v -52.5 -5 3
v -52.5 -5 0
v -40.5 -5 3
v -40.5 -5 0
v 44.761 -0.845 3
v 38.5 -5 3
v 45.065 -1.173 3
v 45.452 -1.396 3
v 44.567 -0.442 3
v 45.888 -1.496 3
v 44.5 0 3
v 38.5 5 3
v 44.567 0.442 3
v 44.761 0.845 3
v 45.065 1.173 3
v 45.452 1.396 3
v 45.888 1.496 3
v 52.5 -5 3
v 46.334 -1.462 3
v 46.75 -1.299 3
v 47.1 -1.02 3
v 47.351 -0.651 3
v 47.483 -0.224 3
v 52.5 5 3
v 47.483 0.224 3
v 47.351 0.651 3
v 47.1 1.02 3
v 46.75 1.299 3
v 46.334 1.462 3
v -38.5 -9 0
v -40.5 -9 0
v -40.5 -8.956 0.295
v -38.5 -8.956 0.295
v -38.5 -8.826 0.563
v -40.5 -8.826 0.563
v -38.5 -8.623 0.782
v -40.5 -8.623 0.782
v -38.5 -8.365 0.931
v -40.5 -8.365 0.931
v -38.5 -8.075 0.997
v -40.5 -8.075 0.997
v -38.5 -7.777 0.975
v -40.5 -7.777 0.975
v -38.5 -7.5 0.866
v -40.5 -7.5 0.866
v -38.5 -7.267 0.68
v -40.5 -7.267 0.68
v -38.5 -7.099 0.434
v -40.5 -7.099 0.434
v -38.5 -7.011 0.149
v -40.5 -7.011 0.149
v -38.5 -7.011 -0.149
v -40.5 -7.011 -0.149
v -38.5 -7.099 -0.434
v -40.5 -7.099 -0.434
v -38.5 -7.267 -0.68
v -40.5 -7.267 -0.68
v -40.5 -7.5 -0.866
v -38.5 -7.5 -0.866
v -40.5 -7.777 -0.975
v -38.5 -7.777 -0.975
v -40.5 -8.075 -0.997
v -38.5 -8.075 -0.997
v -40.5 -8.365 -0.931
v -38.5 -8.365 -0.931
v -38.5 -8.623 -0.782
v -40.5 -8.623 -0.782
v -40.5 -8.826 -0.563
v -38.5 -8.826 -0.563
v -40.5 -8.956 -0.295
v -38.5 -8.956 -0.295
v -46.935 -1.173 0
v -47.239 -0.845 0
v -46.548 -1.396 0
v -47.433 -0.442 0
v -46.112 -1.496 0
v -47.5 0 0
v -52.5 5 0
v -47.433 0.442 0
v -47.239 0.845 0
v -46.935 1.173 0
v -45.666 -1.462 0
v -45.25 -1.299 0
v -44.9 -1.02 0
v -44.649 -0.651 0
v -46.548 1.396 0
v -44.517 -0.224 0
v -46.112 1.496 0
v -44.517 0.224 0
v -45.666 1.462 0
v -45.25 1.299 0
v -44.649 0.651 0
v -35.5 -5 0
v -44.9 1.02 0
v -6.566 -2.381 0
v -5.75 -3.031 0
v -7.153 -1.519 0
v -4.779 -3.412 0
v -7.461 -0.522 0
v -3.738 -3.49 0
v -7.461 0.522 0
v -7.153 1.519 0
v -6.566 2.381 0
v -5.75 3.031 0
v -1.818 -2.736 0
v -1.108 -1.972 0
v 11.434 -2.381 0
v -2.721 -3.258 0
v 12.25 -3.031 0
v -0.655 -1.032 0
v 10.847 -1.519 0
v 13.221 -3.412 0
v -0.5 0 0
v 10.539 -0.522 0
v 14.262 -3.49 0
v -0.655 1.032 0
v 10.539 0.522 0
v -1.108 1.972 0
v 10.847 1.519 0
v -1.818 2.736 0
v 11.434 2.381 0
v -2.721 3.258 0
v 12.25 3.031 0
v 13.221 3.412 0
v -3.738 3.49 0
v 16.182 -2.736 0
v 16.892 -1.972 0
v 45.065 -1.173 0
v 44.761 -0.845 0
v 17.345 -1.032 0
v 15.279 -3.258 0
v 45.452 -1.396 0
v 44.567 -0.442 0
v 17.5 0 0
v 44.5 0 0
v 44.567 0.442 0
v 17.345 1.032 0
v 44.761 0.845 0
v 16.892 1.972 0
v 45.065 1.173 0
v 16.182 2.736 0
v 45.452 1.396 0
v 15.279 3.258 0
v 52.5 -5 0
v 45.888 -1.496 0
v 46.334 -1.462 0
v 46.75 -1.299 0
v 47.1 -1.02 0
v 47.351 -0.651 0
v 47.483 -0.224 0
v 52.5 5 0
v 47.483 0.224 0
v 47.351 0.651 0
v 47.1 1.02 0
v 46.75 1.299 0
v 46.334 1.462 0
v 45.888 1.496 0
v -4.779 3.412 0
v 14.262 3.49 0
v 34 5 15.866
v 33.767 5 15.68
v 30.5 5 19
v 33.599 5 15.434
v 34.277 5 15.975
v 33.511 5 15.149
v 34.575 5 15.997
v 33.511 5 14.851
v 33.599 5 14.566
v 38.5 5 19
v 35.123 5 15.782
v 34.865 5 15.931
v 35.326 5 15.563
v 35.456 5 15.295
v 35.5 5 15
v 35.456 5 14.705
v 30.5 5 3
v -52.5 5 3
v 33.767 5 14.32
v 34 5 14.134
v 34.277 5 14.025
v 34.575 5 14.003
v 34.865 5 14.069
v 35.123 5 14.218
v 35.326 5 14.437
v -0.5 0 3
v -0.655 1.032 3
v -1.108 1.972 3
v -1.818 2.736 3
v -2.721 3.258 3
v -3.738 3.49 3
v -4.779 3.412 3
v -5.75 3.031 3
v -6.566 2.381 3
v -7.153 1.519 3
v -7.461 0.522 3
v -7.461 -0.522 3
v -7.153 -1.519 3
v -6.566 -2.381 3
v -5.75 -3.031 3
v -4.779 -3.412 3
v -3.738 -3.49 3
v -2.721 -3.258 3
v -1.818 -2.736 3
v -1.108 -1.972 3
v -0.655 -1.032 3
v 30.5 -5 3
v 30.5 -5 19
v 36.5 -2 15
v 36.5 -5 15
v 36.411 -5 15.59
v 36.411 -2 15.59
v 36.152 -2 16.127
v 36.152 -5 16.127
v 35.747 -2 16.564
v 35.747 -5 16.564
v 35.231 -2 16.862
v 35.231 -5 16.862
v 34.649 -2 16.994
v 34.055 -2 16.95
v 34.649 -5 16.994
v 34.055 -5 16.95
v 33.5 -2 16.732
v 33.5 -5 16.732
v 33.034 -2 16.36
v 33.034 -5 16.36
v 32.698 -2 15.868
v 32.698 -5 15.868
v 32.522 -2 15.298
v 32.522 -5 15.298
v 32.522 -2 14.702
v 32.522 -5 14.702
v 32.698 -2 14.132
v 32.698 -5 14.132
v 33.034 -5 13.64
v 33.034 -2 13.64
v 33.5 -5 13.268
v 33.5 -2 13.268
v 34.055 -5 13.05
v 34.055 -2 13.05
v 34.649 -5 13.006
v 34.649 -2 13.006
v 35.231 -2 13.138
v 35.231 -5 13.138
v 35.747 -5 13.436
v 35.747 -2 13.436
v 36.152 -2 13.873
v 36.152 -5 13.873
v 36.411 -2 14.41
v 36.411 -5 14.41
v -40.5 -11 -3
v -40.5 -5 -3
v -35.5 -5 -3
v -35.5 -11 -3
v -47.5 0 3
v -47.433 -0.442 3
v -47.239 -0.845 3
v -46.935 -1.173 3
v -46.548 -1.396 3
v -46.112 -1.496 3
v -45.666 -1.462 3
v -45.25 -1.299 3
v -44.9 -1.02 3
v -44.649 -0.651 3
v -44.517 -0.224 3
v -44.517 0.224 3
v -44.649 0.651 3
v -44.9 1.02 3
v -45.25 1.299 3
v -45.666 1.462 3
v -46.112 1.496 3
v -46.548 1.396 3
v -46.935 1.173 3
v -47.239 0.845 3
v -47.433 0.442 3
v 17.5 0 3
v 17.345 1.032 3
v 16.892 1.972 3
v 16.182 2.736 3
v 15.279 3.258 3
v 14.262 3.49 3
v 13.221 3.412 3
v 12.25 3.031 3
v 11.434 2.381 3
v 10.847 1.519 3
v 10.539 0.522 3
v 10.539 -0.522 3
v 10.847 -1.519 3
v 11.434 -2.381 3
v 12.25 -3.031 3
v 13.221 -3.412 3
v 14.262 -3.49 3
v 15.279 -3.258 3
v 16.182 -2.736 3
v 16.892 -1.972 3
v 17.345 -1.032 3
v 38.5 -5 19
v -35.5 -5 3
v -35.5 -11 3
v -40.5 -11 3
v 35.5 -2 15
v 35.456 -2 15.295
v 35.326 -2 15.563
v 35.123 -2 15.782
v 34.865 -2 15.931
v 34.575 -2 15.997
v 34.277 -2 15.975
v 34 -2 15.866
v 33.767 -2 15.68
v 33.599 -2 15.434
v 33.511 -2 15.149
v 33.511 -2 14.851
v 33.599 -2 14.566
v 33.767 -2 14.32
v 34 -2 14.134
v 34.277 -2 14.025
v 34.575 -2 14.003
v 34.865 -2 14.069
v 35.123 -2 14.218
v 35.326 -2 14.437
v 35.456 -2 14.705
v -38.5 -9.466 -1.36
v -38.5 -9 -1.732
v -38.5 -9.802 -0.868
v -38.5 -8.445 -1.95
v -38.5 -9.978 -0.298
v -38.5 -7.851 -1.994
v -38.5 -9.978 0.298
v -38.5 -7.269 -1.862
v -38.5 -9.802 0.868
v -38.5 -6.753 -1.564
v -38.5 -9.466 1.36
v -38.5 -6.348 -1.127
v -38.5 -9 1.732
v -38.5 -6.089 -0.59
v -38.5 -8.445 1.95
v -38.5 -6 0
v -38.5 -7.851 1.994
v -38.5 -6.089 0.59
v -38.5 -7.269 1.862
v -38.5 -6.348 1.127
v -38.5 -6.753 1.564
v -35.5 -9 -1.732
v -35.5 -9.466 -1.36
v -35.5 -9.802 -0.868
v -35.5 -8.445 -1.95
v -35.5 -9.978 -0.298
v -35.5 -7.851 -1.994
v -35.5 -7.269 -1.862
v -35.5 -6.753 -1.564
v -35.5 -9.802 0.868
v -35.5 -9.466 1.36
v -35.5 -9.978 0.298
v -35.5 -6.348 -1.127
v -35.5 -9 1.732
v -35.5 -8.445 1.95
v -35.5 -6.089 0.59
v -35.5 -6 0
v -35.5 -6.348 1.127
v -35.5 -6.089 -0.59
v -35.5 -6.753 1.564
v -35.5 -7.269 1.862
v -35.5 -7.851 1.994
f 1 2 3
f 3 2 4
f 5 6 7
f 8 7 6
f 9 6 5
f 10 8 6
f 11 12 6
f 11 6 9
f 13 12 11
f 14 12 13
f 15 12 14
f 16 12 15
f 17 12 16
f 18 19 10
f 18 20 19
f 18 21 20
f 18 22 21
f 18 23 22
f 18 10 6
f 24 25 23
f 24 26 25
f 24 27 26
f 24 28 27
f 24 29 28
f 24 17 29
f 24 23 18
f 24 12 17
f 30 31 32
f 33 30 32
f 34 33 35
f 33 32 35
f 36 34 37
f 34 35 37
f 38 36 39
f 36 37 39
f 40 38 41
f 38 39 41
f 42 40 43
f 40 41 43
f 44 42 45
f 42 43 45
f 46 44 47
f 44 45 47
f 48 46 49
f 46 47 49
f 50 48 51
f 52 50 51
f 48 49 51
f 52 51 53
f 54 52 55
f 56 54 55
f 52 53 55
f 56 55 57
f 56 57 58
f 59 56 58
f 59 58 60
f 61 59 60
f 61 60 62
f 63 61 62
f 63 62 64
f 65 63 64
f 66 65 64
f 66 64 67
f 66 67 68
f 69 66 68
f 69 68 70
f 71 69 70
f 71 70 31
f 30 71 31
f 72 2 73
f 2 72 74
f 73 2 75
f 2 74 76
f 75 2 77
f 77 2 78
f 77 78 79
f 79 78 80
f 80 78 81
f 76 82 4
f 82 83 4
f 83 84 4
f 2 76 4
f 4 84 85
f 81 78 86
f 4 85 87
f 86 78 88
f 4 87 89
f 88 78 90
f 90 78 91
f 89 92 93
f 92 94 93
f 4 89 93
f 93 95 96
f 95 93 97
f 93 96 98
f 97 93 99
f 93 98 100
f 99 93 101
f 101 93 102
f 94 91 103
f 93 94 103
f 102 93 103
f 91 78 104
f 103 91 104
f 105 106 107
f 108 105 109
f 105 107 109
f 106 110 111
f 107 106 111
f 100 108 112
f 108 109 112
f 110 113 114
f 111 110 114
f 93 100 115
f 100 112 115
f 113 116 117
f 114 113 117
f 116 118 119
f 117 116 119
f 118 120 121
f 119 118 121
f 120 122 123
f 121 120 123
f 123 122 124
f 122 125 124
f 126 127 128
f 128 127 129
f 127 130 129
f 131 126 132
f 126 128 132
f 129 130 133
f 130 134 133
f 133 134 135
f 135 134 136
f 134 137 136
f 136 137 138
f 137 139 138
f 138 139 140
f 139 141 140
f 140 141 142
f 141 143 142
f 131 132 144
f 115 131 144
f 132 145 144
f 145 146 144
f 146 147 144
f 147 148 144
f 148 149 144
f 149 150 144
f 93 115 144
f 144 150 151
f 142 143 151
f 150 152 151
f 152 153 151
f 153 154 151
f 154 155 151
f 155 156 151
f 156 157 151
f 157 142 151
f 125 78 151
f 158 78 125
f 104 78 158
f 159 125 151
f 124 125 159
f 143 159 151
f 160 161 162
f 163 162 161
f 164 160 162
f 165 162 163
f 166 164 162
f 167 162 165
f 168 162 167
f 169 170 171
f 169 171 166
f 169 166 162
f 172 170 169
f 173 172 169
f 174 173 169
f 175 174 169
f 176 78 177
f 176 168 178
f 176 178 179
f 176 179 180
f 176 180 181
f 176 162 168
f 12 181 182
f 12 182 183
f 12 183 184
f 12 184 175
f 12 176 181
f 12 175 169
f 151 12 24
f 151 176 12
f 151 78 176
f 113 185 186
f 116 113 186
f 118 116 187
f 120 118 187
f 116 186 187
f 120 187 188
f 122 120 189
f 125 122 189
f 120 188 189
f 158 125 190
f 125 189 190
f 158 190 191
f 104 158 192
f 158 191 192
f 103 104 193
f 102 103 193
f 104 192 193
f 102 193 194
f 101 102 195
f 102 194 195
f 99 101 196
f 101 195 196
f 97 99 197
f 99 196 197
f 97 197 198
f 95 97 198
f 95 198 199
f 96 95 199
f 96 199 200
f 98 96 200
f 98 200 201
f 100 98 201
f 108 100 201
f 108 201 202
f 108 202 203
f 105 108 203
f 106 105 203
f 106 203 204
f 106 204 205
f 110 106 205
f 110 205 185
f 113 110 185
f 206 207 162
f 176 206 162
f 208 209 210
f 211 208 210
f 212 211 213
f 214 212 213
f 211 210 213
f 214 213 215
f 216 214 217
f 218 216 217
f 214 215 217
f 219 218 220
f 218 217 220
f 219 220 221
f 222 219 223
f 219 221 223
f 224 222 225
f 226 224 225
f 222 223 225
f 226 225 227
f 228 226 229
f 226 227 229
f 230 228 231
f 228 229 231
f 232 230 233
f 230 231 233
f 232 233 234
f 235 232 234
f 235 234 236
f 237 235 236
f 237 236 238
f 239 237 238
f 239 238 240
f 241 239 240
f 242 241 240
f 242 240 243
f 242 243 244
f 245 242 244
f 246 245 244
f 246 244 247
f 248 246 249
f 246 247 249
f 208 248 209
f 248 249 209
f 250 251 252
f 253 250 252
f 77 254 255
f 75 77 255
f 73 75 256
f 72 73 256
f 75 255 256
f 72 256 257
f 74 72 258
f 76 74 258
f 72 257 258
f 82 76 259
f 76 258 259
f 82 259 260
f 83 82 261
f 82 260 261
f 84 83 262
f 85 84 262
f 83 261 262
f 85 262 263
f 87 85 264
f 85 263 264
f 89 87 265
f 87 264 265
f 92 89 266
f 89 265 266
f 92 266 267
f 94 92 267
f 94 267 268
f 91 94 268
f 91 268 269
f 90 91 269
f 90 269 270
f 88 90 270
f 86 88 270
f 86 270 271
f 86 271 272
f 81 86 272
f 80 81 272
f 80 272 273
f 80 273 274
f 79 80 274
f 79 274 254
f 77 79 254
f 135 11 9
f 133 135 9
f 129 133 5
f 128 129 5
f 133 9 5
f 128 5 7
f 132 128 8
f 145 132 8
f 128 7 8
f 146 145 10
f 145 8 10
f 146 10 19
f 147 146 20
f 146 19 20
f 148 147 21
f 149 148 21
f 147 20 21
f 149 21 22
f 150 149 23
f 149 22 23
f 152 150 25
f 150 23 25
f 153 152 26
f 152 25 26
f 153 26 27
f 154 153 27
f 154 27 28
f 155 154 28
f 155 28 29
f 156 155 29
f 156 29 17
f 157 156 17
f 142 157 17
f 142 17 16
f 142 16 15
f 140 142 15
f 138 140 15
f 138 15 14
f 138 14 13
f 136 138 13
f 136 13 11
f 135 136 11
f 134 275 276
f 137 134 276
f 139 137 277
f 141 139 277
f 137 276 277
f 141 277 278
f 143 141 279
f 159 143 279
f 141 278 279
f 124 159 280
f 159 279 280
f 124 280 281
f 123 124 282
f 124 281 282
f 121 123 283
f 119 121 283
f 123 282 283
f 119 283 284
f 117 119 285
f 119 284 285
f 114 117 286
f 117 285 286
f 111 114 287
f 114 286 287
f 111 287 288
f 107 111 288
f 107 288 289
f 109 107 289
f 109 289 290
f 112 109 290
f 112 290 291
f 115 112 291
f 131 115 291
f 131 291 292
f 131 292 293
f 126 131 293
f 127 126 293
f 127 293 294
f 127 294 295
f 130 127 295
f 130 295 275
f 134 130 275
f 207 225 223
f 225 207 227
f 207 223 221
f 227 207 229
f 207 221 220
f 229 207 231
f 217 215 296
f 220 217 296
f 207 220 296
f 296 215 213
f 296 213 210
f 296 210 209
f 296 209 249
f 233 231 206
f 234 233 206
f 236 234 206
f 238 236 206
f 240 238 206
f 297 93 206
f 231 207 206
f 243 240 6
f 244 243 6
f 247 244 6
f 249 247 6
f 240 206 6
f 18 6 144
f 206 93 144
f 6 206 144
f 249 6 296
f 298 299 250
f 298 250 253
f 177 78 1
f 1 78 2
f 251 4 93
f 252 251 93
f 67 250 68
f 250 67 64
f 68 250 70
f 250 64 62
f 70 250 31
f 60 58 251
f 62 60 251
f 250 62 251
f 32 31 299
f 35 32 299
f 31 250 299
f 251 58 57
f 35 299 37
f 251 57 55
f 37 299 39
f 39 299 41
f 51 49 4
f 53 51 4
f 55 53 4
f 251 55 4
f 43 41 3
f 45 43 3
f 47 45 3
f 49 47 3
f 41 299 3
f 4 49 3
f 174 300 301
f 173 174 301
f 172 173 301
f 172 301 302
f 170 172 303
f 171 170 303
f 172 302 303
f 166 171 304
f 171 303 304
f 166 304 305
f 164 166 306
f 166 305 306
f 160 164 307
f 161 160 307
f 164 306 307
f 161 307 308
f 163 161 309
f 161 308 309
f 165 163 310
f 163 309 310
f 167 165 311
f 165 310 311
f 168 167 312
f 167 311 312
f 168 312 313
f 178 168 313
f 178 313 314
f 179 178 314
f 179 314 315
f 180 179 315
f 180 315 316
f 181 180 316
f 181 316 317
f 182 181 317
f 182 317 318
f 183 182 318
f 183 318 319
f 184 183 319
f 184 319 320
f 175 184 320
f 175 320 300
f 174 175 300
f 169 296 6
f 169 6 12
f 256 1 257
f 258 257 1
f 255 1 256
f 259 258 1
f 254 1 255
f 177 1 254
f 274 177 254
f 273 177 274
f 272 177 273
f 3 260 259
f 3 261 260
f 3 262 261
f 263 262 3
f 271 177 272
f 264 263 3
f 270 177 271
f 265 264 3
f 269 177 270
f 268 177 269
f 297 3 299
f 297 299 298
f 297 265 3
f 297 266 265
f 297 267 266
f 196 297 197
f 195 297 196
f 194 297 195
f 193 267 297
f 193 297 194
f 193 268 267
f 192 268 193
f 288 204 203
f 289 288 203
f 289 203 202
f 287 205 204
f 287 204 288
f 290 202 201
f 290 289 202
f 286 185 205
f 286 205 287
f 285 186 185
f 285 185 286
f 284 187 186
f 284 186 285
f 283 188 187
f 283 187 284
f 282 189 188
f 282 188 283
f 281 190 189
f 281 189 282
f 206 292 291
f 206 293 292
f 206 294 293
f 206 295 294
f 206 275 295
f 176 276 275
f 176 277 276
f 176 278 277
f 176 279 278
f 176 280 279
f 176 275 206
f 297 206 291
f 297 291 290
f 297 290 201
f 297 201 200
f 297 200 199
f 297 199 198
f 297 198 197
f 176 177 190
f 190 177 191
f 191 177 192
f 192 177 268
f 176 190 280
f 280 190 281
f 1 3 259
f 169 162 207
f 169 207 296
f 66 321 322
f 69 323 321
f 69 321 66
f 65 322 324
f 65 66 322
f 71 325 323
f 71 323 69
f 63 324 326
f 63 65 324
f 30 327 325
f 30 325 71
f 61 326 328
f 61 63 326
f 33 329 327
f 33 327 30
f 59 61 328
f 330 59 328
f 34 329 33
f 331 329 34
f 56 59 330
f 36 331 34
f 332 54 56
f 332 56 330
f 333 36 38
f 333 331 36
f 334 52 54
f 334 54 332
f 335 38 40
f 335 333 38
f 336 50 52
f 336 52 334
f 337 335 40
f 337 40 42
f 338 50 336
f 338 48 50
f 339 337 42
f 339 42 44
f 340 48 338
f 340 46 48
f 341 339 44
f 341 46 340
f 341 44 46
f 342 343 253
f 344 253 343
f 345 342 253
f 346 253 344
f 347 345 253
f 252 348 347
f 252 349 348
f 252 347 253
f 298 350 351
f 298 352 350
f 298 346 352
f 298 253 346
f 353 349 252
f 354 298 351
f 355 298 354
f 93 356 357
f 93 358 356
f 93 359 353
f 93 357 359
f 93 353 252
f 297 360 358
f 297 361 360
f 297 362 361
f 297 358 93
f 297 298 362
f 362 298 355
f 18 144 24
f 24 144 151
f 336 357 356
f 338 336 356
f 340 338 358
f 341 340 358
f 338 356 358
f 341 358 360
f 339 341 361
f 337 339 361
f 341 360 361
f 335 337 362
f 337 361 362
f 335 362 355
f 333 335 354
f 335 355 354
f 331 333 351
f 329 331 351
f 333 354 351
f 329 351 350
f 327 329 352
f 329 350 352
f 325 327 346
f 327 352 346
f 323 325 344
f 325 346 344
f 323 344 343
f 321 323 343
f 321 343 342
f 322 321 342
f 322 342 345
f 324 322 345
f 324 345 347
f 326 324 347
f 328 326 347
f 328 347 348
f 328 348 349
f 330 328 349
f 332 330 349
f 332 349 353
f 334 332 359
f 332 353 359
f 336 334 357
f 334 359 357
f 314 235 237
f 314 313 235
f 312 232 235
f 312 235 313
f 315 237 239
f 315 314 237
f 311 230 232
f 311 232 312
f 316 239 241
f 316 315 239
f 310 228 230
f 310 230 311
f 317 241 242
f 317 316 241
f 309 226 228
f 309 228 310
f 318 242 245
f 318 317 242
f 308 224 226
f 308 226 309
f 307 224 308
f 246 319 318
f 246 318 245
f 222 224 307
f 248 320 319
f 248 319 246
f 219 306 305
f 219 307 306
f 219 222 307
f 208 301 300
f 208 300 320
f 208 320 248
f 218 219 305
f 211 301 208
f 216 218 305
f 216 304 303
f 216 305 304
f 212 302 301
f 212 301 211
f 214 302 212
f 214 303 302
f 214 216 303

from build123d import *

# Parameters (mm, degrees)
F0_W      = 105
F0_H      = 5
F1_DEPTH  = 3
F3_DEPTH  = 3.001
F4_R      = 3.5
F5_DEPTH  = 3.001
F6_DEPTH  = 3.001
F7_W      = 8
F7_H      = 10
F8_DEPTH  = 16
F9_R      = 1
F10_DEPTH = 10.001
F11_R     = 2
F12_DEPTH = 3
F13_W     = 5
F13_H     = 6
F14_DEPTH = 6
F15_R     = 1
F16_DEPTH = 93.001
F17_R     = 2
F18_DEPTH = 3


with BuildPart() as f1:
    # F0 (on Top) → F1 (new body)
    with BuildSketch(Plane.XY):
        with Locations((0, -2.5)):
            Rectangle(F0_W, F0_H)
        with Locations((0, 2.5)):
            Rectangle(F0_W, F0_H)
    extrude(amount=F1_DEPTH)

    # F2 (on face) → F3 (cut, through all)
    with BuildSketch(Plane.XY.offset(3)):
        with BuildLine():
            ThreePointArc((-44.5, 0), (-46, 1.5), (-47.5, 0))
            Line((-47.5, 0), (-44.5, 0))
        make_face()
        with BuildLine():
            ThreePointArc((47.5, 0), (46, 1.5), (44.5, 0))
            Line((44.5, 0), (47.5, 0))
        make_face()
        with BuildLine():
            Line((47.5, 0), (44.5, 0))
            ThreePointArc((44.5, 0), (46, -1.5), (47.5, 0))
        make_face()
        with BuildLine():
            Line((-44.5, 0), (-47.5, 0))
            ThreePointArc((-47.5, 0), (-46, -1.5), (-44.5, 0))
        make_face()
    extrude(amount=-F3_DEPTH, mode=Mode.SUBTRACT)

    # F4 (on face) → F5 (cut, through all)
    with BuildSketch(Plane.XY.offset(3)):
        with Locations((-4, 0)):
            Circle(F4_R)
        with Locations((14, 0)):
            Circle(F4_R)
    extrude(amount=-F5_DEPTH, mode=Mode.SUBTRACT)

    # F4 (on face) → F6 (cut, through all)
    with BuildSketch(Plane.XY.offset(3)):
        with Locations((-4, 0)):
            Circle(F4_R)
        with Locations((14, 0)):
            Circle(F4_R)
    extrude(amount=-F6_DEPTH, mode=Mode.SUBTRACT)

    # F7 (on face) → F8 (join)
    with BuildSketch(Plane.XY.offset(3)):
        with Locations((34.5, 0)):
            Rectangle(F7_W, F7_H)
    extrude(amount=F8_DEPTH)

    # F9 (on face) → F10 (cut, through all)
    with BuildSketch(Plane.XZ.offset(5)):
        with Locations((34.5, 15)):
            Circle(F9_R)
    extrude(amount=-F10_DEPTH, mode=Mode.SUBTRACT)

    # F11 (on face) → F12 (cut)
    with BuildSketch(Plane.XZ.offset(5)):
        with Locations((34.5, 15)):
            Circle(F11_R)
    extrude(amount=-F12_DEPTH, mode=Mode.SUBTRACT)

    # F13 (on face) → F14 (join)
    with BuildSketch(Plane.XY.offset(3)):
        with Locations((-38, -8)):
            Rectangle(F13_W, F13_H)
    extrude(amount=-F14_DEPTH)

    # F15 (on face) → F16 (cut, through all)
    with BuildSketch(Plane(origin=(-40.5, 0, 0), x_dir=(0, -1, 0), z_dir=(-1, 0, 0))):
        with Locations((8, 0)):
            Circle(F15_R)
    extrude(amount=-F16_DEPTH, mode=Mode.SUBTRACT)

    # F17 (on face) → F18 (cut)
    with BuildSketch(Plane.YZ.offset(-35.5)):
        with Locations((-8, 0)):
            Circle(F17_R)
    extrude(amount=-F18_DEPTH, mode=Mode.SUBTRACT)


solid = f1.part
